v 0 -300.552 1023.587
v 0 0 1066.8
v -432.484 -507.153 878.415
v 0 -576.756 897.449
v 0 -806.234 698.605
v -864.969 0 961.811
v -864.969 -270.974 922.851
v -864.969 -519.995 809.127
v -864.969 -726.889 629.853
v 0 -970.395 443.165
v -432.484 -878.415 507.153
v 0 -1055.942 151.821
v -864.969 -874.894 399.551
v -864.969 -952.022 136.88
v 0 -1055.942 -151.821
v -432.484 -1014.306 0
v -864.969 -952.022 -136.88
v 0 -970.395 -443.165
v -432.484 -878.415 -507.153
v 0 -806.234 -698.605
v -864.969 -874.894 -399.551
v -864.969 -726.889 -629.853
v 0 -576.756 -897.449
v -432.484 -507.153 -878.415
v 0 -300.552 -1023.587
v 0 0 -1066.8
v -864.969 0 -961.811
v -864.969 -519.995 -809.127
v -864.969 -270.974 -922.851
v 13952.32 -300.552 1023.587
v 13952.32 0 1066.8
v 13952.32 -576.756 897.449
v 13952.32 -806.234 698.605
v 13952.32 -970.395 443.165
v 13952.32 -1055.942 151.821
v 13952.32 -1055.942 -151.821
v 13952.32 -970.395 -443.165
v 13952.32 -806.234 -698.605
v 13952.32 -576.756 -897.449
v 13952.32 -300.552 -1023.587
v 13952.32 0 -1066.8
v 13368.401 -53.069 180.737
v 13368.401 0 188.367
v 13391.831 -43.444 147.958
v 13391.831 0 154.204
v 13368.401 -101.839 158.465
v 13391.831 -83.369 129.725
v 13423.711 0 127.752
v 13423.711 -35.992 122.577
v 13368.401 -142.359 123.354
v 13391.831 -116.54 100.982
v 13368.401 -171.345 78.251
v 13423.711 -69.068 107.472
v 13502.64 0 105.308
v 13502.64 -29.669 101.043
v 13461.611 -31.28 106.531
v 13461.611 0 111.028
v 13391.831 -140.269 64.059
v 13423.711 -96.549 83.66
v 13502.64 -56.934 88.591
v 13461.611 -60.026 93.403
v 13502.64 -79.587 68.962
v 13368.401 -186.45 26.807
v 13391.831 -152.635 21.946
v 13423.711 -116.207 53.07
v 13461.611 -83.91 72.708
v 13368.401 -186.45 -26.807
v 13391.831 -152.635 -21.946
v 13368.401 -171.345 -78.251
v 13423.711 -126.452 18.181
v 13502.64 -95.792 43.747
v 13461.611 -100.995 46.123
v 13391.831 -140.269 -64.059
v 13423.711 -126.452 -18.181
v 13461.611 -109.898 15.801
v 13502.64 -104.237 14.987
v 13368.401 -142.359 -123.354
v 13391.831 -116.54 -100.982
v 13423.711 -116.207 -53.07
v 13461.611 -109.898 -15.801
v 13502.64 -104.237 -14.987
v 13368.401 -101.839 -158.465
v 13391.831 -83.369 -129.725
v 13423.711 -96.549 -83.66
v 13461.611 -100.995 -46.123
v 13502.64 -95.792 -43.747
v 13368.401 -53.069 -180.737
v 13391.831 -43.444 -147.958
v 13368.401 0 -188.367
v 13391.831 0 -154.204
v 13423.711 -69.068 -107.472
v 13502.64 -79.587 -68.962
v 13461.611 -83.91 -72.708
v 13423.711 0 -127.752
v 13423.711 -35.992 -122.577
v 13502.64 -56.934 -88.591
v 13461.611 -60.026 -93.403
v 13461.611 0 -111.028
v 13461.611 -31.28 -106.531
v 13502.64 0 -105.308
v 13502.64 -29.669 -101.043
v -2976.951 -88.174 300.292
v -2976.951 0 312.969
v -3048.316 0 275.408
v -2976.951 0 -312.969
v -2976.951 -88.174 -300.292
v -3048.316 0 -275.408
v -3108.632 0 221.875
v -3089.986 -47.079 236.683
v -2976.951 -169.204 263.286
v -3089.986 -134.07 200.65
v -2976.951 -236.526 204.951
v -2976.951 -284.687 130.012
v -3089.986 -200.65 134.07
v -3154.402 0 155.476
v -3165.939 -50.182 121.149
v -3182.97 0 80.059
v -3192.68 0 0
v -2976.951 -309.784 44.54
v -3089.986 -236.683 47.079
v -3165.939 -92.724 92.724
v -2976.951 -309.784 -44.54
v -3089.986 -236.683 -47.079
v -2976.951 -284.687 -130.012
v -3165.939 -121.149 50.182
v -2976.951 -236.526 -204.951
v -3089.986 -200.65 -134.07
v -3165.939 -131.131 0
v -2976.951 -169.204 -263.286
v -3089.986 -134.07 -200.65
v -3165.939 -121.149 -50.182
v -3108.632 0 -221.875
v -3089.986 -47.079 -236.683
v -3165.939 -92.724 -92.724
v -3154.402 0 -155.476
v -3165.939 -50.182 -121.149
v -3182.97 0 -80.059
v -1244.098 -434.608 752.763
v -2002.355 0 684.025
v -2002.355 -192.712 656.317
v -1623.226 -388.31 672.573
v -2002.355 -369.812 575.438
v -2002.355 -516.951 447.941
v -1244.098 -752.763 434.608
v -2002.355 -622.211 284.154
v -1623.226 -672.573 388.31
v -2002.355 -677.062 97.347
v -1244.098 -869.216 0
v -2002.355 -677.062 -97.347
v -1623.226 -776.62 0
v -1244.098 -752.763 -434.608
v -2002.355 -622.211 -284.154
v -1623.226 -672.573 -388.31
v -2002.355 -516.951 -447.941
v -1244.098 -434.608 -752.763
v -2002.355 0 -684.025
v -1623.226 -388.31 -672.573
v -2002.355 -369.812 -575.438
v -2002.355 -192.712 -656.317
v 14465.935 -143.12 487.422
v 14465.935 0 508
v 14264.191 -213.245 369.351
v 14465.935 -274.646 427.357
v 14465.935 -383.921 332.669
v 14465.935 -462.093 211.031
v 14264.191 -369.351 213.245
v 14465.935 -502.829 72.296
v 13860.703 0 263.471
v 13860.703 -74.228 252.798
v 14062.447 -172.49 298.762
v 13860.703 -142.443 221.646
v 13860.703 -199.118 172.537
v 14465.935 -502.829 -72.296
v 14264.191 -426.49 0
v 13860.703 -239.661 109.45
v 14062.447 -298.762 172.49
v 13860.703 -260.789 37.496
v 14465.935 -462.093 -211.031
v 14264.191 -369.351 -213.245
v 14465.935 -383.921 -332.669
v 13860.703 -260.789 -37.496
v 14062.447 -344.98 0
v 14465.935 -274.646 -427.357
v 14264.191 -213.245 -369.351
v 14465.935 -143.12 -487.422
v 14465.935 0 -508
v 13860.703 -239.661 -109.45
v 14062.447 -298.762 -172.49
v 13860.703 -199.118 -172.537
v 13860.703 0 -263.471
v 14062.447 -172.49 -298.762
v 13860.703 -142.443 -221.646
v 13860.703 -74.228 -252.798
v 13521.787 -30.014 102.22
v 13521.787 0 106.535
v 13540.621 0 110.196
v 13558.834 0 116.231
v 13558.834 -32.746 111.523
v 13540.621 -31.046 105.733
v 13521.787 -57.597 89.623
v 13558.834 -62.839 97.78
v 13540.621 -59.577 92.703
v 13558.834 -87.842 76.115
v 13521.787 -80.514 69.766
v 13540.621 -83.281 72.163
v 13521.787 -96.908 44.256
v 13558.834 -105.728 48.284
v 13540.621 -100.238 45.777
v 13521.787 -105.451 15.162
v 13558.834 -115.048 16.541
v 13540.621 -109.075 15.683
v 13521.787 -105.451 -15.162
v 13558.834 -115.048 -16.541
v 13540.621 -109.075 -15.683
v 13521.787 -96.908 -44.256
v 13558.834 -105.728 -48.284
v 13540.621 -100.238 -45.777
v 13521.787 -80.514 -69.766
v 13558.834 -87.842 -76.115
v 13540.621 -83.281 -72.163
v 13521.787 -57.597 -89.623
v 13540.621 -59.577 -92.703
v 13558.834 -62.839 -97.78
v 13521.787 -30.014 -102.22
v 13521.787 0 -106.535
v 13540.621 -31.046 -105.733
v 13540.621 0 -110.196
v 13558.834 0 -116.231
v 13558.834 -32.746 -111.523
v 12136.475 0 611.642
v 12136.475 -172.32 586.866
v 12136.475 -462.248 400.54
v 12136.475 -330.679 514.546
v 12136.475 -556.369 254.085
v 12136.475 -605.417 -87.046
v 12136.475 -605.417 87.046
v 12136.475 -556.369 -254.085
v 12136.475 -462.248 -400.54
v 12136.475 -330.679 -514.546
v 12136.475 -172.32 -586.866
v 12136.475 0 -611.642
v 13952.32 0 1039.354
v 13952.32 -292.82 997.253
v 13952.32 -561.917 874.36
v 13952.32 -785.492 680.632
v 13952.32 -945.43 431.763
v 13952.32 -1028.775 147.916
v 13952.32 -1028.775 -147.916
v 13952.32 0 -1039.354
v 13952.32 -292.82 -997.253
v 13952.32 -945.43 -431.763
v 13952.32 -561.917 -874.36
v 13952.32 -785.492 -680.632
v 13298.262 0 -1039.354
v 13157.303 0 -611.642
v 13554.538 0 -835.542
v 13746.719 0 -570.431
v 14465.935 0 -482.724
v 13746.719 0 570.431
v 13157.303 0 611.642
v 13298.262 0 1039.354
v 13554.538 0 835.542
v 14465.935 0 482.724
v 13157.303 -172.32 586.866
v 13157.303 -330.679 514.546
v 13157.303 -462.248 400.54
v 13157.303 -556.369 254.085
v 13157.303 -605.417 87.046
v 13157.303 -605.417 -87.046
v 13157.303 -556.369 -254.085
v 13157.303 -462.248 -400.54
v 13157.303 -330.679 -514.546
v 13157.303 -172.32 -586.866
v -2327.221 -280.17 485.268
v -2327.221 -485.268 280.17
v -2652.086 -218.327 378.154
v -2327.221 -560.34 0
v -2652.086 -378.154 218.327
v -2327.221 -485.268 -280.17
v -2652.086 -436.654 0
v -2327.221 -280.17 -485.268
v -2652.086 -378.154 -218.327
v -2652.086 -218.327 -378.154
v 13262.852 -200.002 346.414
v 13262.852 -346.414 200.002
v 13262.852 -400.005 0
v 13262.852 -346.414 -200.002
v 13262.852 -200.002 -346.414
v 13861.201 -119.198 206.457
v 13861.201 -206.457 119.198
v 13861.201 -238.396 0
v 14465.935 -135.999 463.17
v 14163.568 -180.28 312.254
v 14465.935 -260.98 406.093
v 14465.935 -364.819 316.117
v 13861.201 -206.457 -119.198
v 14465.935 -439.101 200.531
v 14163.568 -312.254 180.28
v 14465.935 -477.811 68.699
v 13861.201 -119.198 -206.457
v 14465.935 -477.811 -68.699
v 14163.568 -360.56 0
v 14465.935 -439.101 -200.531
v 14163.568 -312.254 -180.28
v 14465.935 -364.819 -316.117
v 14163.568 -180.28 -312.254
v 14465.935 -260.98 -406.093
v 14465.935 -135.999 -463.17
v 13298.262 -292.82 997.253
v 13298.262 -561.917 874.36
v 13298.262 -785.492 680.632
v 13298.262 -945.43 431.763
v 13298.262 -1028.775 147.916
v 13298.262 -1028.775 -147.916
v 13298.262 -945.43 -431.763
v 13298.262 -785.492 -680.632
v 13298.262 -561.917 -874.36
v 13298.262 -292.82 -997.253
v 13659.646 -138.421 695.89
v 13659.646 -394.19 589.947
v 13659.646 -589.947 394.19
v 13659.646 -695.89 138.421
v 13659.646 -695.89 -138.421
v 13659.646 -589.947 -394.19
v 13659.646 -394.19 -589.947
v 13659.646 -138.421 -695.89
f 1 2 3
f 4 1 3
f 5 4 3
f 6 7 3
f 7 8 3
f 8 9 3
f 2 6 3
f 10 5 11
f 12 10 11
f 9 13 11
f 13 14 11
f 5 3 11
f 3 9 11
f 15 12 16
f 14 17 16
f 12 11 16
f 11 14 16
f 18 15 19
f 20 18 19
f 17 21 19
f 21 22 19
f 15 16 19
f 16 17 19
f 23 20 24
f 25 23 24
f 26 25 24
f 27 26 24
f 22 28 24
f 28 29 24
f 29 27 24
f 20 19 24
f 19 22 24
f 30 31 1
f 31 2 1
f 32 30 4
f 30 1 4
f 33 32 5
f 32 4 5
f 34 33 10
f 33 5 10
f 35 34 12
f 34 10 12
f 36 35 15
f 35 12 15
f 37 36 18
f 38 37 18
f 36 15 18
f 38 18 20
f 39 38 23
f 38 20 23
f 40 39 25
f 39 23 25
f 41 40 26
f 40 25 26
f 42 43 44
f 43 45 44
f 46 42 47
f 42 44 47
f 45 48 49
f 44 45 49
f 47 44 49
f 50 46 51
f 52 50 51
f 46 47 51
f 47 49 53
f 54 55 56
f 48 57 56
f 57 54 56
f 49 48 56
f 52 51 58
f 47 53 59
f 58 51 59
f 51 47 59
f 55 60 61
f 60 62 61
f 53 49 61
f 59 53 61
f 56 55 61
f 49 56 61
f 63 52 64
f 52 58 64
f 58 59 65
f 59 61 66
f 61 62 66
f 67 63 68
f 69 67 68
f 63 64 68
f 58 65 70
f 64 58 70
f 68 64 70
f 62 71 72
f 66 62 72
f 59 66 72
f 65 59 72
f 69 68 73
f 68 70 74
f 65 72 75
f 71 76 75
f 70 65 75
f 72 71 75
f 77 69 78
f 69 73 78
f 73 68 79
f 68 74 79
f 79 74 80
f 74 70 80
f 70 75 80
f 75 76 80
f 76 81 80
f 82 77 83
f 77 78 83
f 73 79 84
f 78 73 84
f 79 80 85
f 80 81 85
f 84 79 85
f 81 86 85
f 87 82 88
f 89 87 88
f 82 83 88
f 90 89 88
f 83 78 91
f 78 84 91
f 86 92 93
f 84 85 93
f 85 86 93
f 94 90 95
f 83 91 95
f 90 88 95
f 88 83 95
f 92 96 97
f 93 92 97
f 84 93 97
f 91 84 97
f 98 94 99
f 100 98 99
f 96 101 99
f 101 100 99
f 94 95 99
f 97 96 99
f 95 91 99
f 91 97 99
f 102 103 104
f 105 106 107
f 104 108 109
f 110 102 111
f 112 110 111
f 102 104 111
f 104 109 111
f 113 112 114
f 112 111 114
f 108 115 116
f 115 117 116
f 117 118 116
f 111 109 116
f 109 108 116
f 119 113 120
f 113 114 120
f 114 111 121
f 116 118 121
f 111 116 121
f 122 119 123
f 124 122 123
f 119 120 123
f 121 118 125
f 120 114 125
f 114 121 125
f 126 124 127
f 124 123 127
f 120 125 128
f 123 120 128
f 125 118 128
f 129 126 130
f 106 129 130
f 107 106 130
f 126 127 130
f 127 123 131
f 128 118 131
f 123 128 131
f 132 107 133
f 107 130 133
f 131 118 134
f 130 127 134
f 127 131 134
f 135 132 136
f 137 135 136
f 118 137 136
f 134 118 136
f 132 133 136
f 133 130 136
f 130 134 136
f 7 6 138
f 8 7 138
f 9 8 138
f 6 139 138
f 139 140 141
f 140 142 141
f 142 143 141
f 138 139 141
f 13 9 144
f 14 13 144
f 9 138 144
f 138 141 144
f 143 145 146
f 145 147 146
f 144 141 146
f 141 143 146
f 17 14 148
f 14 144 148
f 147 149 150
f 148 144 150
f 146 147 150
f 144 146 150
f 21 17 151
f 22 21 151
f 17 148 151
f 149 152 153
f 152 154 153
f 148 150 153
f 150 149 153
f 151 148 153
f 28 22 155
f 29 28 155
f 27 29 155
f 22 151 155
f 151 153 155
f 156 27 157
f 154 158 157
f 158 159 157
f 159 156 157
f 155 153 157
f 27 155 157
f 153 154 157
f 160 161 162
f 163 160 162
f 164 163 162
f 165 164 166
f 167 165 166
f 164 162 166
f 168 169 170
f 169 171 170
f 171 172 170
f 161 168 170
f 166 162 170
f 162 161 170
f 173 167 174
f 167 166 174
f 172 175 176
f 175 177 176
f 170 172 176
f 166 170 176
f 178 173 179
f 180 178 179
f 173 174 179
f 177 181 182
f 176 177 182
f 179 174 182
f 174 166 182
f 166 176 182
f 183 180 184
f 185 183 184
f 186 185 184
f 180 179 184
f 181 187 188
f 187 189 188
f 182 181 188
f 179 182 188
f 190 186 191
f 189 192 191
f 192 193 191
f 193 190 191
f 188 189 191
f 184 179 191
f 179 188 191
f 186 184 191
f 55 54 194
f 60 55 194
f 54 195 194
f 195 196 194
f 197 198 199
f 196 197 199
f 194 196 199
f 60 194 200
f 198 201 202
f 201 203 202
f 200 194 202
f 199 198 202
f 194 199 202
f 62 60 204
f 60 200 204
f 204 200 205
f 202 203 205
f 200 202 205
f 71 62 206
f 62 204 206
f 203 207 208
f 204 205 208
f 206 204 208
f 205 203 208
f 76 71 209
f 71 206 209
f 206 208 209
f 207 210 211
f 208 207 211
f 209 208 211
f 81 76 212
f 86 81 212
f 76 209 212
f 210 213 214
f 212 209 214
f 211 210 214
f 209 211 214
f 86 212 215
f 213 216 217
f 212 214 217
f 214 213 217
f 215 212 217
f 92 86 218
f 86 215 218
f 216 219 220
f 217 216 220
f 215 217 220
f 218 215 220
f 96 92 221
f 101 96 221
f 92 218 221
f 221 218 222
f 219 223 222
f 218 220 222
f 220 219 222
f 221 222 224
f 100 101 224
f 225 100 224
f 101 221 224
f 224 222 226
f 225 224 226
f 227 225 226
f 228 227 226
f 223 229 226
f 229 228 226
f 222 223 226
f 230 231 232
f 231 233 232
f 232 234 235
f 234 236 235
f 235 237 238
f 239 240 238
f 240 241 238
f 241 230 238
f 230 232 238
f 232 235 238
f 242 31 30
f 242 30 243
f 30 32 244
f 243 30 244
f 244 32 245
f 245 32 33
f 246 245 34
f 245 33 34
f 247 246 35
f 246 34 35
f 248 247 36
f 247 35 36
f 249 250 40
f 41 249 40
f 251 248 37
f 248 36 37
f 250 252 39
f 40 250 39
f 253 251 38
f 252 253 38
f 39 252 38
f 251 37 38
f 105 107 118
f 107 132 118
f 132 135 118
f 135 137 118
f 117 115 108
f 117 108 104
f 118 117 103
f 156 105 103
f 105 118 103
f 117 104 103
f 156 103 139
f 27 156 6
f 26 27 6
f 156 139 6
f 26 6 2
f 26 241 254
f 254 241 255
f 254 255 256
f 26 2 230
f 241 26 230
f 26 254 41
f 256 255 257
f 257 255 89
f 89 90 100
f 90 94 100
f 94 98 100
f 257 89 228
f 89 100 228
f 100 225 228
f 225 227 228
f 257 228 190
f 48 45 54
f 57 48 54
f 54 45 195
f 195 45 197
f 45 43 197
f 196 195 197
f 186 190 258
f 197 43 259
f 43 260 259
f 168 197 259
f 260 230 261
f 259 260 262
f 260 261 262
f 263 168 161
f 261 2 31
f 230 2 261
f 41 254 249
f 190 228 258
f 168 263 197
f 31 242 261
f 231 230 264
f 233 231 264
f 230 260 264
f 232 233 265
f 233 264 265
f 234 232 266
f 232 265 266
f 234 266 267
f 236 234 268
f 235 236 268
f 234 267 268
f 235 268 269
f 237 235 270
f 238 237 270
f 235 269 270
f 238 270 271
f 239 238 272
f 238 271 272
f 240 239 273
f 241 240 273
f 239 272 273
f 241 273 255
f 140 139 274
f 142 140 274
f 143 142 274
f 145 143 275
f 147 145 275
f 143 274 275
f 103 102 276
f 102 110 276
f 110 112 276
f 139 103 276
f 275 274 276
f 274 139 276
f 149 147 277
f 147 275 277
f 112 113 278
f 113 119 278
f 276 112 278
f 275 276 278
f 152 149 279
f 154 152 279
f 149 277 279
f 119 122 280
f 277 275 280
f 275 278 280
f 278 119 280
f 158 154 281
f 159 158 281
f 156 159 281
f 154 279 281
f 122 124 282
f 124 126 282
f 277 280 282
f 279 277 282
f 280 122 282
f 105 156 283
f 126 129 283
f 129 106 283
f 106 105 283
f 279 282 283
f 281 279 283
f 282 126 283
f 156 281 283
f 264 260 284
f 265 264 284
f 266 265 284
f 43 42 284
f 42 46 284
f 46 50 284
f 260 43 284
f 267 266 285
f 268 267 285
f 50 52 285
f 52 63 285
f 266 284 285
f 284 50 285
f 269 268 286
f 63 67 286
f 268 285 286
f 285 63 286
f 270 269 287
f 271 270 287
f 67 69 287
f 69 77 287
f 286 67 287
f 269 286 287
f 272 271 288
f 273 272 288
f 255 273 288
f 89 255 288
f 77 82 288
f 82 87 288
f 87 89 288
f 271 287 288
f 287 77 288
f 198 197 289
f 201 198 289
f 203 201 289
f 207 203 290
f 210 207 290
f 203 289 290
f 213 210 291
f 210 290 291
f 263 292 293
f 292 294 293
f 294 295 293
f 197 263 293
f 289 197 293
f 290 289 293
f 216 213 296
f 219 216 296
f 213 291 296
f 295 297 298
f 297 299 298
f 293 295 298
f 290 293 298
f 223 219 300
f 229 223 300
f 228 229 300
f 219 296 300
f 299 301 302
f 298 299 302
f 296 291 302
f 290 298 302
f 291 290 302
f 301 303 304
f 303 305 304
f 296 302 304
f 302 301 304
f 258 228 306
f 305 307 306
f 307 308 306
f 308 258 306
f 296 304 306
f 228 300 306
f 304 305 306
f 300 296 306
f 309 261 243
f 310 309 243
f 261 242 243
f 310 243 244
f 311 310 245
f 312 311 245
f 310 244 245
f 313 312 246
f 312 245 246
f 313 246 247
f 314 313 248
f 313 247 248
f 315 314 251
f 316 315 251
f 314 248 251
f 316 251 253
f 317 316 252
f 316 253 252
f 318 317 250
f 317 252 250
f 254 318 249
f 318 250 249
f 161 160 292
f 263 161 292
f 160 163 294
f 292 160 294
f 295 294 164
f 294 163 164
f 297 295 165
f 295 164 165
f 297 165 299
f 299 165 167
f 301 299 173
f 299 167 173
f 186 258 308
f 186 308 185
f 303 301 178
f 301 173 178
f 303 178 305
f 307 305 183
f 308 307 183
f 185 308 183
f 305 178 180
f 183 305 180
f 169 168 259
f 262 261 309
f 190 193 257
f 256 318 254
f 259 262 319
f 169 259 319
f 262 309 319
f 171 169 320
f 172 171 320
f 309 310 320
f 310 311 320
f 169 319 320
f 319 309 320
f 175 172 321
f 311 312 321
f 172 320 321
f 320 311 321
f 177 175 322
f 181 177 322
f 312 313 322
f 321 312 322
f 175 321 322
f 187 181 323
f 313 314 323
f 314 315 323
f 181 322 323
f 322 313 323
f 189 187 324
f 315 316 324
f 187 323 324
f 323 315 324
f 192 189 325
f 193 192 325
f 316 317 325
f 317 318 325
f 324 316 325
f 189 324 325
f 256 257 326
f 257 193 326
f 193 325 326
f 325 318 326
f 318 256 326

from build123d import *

# Parameters (mm, degrees)
F1_ANGLE = 180


with BuildPart() as f1:
    # F0 (on Front) → F1 (revolve)
    with BuildSketch(Plane.XZ):
        with BuildLine():
            Line((13952.3196879505, 1066.8), (0, 1066.8))
            Line((0, 1066.8), (-864.9686047513, 961.8114734625))
            Line((-864.9686047513, 961.8114734625), (-2002.3552955837, 684.0247720961))
            Line((-2002.3552955837, 684.0247720961), (-2976.9514947803, 312.9691331448))
            ThreePointArc((-2976.9514947803, 312.9691331448), (-3133.5230556351, 190.0582811283), (-3192.6803120495, 0))
            Line((-3192.6803120495, 0), (12136.4754910278, 0))
            Line((12136.4754910278, 0), (12136.4754910278, 611.6421476167))
            Line((12136.4754910278, 611.6421476167), (13157.3033463571, 611.6421476167))
            Line((13157.3033463571, 611.6421476167), (13368.401, 188.3673656228))
            ThreePointArc((13368.401, 188.3673656228), (13423.7113916071, 127.7521298206), (13502.64, 105.3084))
            ThreePointArc((13502.64, 105.3084), (13531.2627405393, 108.0644564433), (13558.8337203562, 116.2313527344))
            Line((13558.8337203562, 116.2313527344), (13952.3196879505, 275.2100031406))
            Line((13952.3196879505, 275.2100031406), (14465.935, 482.7240591992))
            Line((14465.935, 482.7240591992), (14465.935, 508))
            Line((14465.935, 508), (13860.7033572475, 263.4705436227))
            ThreePointArc((13860.7033572475, 263.4705436227), (13659.6459839666, 709.523311654), (13298.2616424561, 1039.3543243408))
            Line((13298.2616424561, 1039.3543243408), (13952.3196879505, 1039.3543243408))
            Line((13952.3196879505, 1039.3543243408), (13952.3196879505, 1066.8))
        make_face()
    revolve(axis=Axis((28212.9992331256, 0, 0), (1, 0, 0)), revolution_arc=F1_ANGLE)


solid = f1.part
